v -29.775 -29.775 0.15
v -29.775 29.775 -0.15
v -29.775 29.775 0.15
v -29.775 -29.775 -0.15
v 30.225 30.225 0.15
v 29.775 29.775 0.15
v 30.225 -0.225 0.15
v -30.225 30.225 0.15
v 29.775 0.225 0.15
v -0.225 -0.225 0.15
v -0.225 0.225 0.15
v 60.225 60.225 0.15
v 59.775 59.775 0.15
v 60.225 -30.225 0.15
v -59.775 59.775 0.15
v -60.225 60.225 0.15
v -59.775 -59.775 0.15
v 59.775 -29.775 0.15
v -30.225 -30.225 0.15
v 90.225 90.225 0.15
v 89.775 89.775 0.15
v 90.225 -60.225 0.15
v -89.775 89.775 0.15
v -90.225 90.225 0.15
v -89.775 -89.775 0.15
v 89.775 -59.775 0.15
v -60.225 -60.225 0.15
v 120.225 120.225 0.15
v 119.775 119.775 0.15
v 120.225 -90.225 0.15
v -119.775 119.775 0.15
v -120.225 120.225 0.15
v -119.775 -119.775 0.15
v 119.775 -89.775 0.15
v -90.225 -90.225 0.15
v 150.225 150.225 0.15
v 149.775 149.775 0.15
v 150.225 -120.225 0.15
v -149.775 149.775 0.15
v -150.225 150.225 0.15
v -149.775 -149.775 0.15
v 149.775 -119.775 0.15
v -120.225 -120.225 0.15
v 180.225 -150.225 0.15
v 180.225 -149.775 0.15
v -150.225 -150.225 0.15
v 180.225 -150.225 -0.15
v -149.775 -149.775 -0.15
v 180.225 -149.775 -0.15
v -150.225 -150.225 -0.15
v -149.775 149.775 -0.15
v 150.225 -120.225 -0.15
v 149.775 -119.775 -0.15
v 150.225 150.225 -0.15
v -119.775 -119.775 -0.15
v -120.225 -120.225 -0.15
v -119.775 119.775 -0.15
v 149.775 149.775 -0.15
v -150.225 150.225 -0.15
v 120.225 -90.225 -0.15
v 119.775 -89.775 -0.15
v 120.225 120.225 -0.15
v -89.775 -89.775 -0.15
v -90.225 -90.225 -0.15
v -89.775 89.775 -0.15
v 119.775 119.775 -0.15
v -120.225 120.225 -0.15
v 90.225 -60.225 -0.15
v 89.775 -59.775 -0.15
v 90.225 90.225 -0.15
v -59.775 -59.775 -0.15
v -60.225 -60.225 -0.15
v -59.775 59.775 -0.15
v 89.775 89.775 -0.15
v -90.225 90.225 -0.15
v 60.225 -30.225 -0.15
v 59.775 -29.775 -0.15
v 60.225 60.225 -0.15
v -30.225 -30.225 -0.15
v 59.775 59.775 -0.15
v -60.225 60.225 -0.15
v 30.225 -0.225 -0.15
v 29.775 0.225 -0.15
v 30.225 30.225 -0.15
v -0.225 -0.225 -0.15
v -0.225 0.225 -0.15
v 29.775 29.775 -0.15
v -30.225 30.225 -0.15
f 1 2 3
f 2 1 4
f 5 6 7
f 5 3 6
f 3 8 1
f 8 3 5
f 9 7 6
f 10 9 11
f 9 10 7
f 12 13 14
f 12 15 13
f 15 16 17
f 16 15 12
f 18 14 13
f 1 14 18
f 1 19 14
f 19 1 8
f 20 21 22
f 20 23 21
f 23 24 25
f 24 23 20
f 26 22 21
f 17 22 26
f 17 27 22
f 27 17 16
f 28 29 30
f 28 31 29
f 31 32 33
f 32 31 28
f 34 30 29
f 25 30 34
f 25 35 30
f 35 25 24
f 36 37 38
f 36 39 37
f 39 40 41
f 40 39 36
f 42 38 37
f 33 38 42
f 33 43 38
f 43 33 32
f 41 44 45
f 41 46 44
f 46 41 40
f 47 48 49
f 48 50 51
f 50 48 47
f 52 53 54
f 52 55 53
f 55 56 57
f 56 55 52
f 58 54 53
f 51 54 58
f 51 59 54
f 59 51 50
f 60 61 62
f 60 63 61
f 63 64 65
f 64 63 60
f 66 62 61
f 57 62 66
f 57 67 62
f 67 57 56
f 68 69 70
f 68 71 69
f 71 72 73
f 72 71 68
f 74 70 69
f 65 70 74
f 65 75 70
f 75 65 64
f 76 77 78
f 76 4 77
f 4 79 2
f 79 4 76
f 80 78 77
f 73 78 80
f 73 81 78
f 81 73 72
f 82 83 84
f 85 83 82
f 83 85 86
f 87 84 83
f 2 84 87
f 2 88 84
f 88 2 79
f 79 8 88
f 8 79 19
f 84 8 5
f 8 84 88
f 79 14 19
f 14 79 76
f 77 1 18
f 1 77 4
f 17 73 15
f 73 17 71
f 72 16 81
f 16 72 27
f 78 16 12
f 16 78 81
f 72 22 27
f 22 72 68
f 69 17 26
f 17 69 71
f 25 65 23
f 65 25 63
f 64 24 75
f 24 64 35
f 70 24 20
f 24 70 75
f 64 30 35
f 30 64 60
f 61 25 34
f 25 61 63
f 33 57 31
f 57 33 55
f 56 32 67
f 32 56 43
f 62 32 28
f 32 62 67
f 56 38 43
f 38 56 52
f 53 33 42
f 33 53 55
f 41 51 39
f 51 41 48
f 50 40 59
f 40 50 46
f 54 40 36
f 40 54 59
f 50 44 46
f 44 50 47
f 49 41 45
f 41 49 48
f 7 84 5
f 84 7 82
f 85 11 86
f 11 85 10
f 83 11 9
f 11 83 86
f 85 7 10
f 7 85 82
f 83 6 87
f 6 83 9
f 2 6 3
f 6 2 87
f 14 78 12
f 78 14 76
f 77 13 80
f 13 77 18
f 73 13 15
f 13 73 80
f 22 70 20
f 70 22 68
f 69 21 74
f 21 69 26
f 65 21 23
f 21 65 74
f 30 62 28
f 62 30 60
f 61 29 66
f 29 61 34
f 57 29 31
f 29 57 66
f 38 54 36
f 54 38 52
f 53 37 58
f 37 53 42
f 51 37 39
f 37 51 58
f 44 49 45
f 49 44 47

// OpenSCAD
zheight = 0.3; //height of the line drawn, ideally 0.1mm less than layer height?
width = 0.45; //modify so CURA renders as just one line draw

SPIRAL_LENGTH = 30;

CYCLE_COUNT = 20; // modify so spiral fits print bed
for(i=[0:CYCLE_COUNT]) {
	union() {
	CUR_LOOP = ((i - (i%4))/4) + 1;

	if(i%4==0) {
		translate([SPIRAL_LENGTH*CUR_LOOP/2,-1*SPIRAL_LENGTH*(CUR_LOOP-1),0])
		cube([SPIRAL_LENGTH*CUR_LOOP+(width),width,zheight],center=true);
	}
	if(i%4==1) {
		
		if(i==1) {
			Y_OFFSET = SPIRAL_LENGTH/2;
		
			translate([SPIRAL_LENGTH*CUR_LOOP,Y_OFFSET,0])
				cube([width,SPIRAL_LENGTH*CUR_LOOP+width,zheight],center=true);
		} else {
			Y_OFFSET = SPIRAL_LENGTH/2;
			translate([SPIRAL_LENGTH*CUR_LOOP,Y_OFFSET,0])
				cube([width,SPIRAL_LENGTH*CUR_LOOP + (SPIRAL_LENGTH*(CUR_LOOP-1))+width,zheight],center=true);
		}
	}
	if(i%4==2) {
		translate([0,CUR_LOOP*SPIRAL_LENGTH,0])
			cube([SPIRAL_LENGTH*CUR_LOOP*2,width,zheight],center=true);
		
	}
	if(i%4==3) {
		Y_OFFSET = 0;//SPIRAL_LENGTH*CUR_LOOP/2;
		
		translate([-1*SPIRAL_LENGTH*CUR_LOOP,Y_OFFSET,0])
			cube([width,SPIRAL_LENGTH*(CUR_LOOP+1) + (SPIRAL_LENGTH*(CUR_LOOP-1))+width,zheight],center=true);
		
		//finishing bottom row
		translate([SPIRAL_LENGTH*CUR_LOOP/-2,-1*SPIRAL_LENGTH*(CUR_LOOP),0])
			cube([SPIRAL_LENGTH*CUR_LOOP,width,zheight],center=true);
	}
}
}
